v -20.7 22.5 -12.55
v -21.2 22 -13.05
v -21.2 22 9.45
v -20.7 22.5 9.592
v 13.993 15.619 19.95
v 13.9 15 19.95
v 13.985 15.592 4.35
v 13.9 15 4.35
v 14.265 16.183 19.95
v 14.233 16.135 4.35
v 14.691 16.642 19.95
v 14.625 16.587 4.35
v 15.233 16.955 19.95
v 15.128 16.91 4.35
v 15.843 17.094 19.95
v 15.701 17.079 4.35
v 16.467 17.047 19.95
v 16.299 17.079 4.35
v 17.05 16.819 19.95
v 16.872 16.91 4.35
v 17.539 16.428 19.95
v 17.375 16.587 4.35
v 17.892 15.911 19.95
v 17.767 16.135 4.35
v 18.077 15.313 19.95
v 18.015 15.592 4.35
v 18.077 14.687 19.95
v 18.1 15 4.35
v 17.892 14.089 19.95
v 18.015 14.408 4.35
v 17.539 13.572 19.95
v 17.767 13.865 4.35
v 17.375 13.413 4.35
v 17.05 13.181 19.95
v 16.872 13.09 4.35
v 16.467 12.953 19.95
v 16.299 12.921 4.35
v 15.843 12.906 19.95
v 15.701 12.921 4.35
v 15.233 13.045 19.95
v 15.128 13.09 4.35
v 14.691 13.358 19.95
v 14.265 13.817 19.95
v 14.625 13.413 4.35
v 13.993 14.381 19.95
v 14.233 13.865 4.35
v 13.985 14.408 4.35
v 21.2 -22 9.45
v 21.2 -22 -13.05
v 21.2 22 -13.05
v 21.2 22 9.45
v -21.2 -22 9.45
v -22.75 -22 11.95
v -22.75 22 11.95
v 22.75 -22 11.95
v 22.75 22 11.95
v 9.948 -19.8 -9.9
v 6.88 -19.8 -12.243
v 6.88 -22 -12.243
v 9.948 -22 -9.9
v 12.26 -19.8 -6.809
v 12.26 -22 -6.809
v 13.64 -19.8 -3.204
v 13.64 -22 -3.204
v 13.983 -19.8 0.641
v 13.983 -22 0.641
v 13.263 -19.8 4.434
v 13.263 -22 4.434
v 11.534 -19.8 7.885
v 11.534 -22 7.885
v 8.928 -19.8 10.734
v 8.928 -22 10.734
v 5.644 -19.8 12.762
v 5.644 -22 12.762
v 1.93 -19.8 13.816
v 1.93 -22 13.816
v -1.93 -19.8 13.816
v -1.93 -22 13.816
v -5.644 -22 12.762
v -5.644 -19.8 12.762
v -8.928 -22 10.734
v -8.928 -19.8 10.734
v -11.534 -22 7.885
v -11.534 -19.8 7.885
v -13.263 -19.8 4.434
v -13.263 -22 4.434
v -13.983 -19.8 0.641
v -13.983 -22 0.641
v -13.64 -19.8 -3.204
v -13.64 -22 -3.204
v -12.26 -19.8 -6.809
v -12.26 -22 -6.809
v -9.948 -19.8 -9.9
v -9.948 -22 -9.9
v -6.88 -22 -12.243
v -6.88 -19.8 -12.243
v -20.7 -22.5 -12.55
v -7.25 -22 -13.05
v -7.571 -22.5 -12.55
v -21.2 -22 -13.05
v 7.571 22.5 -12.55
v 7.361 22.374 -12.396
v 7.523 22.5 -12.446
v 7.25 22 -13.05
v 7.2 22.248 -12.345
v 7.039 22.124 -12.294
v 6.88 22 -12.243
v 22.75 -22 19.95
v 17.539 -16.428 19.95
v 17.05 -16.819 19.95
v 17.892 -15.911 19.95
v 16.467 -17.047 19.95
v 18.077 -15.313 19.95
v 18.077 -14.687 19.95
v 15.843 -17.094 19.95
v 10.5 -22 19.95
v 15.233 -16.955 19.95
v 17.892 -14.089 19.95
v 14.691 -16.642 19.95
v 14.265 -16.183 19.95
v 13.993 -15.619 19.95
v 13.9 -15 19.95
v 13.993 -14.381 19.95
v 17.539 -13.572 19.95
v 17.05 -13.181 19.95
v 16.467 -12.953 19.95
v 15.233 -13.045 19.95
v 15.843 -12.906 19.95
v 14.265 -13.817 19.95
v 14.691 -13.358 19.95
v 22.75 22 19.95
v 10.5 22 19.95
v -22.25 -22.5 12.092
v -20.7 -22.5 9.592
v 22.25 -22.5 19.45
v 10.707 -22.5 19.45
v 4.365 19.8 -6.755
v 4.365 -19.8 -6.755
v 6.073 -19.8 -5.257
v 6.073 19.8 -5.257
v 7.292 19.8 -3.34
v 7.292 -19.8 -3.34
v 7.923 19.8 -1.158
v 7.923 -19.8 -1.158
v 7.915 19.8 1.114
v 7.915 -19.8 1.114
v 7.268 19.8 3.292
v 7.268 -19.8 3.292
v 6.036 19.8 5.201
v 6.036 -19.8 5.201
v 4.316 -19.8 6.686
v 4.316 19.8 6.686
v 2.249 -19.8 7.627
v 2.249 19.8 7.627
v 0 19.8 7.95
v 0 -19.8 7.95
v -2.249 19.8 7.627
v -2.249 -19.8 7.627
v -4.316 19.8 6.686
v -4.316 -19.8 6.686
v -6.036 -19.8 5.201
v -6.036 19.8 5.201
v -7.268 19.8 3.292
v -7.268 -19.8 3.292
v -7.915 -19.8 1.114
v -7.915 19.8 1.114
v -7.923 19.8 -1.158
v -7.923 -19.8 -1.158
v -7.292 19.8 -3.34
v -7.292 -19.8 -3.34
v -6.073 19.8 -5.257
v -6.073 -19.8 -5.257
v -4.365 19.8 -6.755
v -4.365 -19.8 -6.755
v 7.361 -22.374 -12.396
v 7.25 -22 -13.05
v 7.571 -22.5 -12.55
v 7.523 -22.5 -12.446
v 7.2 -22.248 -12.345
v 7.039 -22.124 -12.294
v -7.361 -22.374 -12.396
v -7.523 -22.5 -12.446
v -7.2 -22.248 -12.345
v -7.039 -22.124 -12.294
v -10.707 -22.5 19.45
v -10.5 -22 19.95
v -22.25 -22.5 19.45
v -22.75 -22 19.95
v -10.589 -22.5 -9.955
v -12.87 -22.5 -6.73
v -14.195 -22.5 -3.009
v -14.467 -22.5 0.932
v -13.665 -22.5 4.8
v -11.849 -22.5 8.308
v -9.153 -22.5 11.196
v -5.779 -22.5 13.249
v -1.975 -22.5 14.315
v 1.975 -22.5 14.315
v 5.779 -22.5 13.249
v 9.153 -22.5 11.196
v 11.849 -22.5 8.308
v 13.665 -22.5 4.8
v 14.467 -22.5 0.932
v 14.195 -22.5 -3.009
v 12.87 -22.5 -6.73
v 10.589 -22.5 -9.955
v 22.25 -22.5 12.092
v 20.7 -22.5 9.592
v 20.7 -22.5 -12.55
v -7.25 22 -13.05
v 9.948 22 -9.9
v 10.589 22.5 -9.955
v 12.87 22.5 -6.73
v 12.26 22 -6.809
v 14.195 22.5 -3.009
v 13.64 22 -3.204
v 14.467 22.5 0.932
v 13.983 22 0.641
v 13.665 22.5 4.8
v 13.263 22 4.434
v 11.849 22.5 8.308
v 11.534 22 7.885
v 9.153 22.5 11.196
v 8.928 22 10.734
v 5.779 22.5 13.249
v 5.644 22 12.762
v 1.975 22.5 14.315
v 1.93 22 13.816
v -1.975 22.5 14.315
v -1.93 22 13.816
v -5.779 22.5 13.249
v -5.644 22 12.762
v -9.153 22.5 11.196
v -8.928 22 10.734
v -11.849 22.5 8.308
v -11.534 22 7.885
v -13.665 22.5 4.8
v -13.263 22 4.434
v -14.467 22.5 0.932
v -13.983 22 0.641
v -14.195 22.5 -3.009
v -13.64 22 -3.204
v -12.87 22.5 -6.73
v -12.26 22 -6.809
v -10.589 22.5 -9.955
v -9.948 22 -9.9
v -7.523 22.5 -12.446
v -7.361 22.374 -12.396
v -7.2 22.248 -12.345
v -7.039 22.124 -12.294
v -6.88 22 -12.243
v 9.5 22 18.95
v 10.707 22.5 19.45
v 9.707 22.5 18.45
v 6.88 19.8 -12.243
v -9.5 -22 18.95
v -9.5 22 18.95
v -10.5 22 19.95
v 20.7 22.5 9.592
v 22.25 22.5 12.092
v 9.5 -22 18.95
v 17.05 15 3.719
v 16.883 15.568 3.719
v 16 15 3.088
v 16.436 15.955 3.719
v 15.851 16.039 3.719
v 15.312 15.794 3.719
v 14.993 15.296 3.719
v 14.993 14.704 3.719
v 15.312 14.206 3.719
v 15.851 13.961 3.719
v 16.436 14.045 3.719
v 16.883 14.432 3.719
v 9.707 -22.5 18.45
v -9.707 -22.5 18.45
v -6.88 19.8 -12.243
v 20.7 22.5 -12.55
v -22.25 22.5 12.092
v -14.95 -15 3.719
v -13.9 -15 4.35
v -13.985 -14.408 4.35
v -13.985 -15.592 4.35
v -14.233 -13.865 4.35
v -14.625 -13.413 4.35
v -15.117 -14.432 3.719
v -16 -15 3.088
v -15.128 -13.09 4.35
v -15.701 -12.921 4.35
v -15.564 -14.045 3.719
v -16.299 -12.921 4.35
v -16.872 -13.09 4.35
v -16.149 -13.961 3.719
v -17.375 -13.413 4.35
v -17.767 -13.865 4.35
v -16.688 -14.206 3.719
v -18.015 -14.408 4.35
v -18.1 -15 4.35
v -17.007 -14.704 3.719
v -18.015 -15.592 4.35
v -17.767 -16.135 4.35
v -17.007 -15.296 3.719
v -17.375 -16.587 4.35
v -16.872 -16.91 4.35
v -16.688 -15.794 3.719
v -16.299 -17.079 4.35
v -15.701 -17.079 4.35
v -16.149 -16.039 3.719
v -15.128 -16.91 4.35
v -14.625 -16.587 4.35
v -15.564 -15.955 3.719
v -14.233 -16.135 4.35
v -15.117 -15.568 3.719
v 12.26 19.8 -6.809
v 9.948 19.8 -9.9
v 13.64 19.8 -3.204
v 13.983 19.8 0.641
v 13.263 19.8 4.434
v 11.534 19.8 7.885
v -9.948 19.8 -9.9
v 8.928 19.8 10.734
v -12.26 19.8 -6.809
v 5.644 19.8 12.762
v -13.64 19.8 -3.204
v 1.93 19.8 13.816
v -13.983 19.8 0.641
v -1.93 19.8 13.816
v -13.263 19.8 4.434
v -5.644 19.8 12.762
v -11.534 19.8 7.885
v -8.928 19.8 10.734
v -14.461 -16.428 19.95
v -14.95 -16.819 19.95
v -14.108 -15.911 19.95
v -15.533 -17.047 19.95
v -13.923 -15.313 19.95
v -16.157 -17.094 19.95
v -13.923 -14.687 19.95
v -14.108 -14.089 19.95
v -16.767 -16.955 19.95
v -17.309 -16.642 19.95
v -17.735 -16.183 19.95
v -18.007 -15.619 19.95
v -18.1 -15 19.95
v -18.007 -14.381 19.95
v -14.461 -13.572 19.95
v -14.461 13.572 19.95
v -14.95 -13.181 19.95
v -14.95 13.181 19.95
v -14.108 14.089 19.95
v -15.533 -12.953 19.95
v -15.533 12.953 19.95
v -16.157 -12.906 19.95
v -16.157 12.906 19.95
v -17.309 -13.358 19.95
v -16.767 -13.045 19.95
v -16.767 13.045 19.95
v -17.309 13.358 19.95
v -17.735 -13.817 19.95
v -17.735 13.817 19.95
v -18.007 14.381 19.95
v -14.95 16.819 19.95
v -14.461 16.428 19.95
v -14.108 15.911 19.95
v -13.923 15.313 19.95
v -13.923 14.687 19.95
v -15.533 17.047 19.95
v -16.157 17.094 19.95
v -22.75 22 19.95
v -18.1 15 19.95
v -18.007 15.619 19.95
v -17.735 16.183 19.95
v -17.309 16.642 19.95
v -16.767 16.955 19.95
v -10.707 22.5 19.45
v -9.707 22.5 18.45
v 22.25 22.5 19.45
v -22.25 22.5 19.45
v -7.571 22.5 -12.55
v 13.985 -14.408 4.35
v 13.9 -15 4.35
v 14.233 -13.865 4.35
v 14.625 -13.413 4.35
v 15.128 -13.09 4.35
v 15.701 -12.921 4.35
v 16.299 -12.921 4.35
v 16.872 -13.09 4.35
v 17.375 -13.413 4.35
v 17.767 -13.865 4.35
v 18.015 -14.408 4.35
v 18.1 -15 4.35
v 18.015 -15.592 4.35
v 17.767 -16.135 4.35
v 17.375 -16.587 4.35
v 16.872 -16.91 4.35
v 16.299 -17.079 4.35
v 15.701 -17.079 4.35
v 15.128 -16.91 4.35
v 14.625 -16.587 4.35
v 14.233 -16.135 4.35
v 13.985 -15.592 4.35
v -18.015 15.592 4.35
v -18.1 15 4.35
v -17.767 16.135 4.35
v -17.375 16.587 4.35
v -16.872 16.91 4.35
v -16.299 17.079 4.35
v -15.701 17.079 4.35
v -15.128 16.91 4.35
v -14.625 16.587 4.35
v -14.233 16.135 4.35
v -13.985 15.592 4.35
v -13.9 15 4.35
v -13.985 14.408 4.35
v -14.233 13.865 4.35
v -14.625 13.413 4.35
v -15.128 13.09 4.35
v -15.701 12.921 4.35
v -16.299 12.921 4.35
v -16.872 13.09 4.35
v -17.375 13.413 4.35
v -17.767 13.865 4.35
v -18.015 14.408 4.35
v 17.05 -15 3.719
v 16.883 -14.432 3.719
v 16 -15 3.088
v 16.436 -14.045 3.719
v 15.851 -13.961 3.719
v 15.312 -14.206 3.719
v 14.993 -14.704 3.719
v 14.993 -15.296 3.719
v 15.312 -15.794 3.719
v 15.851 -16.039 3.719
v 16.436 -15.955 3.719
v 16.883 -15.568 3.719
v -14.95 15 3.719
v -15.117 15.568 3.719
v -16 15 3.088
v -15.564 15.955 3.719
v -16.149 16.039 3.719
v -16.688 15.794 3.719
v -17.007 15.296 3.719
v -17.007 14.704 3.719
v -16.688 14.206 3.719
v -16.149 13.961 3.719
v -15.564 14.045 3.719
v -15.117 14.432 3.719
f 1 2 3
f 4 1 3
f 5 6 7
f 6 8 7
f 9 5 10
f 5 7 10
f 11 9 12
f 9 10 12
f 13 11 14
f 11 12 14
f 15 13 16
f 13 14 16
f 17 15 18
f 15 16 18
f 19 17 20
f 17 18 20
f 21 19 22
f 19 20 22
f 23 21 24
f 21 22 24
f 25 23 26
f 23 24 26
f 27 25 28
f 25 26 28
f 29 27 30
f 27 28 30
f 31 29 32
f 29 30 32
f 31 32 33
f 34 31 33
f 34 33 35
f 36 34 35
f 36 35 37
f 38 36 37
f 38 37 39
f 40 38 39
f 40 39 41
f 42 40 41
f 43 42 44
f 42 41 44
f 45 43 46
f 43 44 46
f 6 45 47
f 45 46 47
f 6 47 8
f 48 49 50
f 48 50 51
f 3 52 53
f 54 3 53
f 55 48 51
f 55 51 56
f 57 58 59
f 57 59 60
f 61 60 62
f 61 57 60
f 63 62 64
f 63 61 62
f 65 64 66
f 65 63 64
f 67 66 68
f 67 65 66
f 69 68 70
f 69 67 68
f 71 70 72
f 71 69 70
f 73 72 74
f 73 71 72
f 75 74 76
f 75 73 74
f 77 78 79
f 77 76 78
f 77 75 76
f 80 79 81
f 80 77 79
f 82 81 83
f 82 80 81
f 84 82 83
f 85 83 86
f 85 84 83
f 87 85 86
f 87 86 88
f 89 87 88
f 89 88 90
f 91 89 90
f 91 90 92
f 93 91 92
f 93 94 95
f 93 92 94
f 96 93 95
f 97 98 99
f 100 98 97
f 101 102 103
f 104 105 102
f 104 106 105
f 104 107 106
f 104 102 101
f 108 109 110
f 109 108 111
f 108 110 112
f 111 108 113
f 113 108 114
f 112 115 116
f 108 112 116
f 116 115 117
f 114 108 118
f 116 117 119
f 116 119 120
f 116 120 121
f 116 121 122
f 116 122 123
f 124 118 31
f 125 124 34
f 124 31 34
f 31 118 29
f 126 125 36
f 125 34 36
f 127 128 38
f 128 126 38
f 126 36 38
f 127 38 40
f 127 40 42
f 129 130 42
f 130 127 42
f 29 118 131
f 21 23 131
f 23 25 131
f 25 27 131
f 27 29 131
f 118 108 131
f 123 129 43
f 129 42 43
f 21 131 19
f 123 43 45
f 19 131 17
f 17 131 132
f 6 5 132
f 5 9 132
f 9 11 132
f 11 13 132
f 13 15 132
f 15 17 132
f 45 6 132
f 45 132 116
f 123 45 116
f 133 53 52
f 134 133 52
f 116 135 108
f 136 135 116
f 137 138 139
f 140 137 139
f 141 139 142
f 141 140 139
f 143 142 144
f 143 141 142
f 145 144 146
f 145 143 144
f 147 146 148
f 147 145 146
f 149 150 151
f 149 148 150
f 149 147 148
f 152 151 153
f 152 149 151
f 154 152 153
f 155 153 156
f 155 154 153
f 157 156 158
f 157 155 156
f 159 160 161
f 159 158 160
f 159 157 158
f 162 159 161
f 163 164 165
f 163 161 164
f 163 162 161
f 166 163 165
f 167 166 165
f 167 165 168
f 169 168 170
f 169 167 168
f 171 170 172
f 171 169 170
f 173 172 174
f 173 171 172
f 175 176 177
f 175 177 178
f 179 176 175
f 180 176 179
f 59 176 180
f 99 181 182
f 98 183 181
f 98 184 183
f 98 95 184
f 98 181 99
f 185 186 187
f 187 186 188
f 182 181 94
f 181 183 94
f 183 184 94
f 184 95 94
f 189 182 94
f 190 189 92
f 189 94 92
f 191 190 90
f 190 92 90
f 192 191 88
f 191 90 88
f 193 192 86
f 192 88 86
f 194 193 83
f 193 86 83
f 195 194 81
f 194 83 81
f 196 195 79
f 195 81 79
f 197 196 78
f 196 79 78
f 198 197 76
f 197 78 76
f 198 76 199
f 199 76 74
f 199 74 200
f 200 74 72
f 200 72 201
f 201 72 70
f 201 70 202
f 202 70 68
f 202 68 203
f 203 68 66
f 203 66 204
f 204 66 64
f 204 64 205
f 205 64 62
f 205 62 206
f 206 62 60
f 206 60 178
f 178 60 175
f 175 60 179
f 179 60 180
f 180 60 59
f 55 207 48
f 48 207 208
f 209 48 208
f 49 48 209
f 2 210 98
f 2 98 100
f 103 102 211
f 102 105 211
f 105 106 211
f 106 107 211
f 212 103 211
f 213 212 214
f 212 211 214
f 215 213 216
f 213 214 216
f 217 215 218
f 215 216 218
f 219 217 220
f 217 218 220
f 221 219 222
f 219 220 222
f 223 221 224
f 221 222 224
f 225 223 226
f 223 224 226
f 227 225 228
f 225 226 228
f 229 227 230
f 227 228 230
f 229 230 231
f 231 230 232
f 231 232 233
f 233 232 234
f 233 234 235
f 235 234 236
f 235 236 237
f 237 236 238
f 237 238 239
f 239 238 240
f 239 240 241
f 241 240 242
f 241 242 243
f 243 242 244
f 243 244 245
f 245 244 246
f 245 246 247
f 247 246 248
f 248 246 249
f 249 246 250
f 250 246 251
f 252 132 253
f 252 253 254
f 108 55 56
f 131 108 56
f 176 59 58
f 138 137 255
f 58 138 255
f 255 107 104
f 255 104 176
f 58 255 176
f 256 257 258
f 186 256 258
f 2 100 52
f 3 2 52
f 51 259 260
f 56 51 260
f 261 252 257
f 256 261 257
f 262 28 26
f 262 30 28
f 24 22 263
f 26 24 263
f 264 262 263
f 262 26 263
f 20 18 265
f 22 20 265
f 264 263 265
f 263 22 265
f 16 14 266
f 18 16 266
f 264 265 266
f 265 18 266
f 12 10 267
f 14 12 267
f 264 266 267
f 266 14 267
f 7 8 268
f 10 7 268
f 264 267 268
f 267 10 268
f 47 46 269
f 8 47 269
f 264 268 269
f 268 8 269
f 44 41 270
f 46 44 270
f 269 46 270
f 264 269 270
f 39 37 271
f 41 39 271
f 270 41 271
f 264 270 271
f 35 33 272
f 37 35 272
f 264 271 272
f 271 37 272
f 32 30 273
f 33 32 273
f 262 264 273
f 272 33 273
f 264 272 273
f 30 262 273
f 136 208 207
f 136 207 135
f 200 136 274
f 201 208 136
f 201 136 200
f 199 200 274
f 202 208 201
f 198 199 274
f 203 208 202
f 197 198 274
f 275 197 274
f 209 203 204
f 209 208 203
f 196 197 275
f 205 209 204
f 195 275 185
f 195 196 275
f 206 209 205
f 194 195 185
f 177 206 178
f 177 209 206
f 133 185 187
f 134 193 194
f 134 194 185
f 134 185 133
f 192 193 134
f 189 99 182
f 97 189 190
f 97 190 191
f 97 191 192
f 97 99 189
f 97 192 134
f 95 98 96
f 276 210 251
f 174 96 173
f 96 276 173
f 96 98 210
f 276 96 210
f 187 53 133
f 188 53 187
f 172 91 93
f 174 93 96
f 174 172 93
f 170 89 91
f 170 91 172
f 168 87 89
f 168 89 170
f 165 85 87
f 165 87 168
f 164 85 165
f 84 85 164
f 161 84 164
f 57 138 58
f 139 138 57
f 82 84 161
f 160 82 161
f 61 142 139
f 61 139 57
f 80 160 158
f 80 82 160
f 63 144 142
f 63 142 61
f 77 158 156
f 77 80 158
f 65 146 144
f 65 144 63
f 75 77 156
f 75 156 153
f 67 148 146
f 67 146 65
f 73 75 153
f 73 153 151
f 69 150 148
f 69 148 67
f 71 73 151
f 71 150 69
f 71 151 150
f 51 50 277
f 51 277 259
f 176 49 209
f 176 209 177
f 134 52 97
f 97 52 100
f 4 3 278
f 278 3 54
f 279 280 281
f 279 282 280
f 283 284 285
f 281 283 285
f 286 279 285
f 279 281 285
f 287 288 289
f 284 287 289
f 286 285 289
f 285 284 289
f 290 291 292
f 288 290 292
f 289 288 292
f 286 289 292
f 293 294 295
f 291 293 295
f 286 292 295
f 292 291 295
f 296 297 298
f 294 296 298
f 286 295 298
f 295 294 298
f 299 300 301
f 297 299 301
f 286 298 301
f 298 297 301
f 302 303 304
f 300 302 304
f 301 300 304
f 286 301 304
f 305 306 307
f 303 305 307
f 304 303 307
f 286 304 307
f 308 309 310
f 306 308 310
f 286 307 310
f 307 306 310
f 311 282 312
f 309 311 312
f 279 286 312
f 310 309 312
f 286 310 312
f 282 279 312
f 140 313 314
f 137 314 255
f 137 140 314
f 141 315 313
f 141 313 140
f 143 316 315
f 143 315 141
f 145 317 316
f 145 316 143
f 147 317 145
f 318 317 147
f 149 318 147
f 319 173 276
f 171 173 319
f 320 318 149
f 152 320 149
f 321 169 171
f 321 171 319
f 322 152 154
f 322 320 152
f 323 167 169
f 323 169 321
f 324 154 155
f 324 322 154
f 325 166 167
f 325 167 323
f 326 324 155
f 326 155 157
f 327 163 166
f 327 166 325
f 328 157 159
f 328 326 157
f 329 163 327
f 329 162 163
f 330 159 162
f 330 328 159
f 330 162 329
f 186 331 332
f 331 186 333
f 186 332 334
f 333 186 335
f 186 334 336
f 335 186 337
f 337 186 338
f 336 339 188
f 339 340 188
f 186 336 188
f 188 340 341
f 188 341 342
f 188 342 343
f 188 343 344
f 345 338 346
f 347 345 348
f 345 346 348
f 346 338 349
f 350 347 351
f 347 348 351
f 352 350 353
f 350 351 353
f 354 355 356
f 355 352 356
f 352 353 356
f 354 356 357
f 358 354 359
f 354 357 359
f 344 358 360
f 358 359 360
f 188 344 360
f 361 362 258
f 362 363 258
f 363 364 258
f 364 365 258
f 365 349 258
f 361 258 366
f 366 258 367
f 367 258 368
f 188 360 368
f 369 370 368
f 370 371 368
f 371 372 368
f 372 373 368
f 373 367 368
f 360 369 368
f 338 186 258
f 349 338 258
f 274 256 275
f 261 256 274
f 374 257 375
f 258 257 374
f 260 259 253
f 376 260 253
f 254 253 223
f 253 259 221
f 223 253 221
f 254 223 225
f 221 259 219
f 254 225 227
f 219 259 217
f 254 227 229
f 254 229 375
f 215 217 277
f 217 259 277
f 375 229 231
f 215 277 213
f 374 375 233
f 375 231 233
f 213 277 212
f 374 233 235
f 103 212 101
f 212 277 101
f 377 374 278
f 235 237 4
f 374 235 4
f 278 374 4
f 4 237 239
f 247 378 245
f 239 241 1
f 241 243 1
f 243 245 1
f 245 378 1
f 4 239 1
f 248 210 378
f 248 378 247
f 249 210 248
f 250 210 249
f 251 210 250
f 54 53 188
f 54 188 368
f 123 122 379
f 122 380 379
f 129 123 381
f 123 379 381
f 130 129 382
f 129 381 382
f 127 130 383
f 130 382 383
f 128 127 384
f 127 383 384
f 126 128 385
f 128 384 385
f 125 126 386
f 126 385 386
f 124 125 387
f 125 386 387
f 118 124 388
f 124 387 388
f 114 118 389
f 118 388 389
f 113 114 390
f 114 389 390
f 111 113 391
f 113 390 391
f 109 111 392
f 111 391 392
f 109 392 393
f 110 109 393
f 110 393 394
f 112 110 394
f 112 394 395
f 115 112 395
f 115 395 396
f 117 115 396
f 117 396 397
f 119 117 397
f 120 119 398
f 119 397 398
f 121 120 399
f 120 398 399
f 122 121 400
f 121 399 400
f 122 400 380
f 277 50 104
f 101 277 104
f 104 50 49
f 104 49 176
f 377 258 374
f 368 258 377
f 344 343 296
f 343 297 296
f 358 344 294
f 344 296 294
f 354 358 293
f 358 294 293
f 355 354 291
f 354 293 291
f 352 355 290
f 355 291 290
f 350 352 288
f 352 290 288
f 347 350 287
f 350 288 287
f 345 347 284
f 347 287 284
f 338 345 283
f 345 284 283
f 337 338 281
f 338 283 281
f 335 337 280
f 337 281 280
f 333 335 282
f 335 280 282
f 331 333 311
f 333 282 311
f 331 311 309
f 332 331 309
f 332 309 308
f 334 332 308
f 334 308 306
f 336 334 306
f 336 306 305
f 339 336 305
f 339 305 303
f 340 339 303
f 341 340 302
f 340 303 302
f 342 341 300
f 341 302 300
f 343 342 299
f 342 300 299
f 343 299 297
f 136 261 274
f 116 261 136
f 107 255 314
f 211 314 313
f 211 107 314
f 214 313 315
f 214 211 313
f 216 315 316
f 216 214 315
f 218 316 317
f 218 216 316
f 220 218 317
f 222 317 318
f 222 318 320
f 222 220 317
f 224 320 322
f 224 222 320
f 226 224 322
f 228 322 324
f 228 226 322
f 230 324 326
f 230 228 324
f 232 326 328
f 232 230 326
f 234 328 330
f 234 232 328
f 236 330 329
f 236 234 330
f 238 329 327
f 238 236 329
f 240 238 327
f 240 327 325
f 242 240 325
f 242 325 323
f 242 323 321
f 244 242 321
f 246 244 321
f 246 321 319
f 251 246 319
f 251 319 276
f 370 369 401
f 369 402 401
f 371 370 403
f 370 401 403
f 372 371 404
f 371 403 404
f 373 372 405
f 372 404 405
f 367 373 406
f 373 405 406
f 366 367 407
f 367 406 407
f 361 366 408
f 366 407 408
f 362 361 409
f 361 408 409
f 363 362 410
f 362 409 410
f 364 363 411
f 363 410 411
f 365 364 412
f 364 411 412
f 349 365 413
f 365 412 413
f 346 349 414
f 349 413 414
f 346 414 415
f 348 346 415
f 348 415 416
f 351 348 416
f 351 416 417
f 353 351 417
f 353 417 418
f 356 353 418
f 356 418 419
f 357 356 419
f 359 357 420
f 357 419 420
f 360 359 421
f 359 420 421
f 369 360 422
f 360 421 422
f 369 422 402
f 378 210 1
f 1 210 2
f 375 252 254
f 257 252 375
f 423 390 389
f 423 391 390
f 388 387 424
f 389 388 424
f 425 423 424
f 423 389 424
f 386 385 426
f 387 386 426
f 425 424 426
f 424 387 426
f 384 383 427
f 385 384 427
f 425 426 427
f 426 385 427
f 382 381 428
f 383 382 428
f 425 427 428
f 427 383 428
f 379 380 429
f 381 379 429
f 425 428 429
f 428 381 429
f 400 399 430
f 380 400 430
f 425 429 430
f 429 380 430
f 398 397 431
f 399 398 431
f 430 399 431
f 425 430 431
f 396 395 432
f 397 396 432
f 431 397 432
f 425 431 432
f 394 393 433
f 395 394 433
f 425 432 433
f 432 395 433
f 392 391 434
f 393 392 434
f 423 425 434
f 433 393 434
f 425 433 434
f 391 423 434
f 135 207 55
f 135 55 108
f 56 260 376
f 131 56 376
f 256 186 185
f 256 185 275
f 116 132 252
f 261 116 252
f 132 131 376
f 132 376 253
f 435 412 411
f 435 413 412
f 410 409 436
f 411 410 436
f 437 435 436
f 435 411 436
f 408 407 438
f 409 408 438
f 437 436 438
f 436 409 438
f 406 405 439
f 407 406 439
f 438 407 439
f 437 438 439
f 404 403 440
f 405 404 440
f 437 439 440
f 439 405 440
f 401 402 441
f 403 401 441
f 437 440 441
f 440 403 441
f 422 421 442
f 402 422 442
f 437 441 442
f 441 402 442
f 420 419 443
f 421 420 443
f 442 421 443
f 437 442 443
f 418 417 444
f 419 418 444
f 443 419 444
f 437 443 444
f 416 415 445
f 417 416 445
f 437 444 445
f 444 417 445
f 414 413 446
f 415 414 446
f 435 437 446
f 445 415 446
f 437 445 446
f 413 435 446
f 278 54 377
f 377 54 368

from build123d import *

# Parameters (mm, degrees)
SKETCH1_W                 = 45.5
SKETCH1_H                 = 45
BOSS_EXTRUDE1_DEPTH       = 33
CUT_EXTRUDE1_DEPTH        = 46
CUT_EXTRUDE2_DEPTH        = 46
CUT_EXTRUDE4_DEPTH        = 46
M5X0_8_TAPPED_HOLE1_D     = 4.2
M5X0_8_TAPPED_HOLE1_DEPTH = 15.6
M5X0_8_TAPPED_HOLE1_TIP   = 1.2618073
CHAMFER1_SIZE             = 0.5


with BuildPart() as part:
    # Sketch1 → Boss-Extrude1 (new body)
    with BuildSketch(Plane(origin=(0, 0, -13.05), x_dir=(-1, 0, 0), z_dir=(0, 0, -1))):
        Rectangle(SKETCH1_W, SKETCH1_H)
    extrude(amount=-BOSS_EXTRUDE1_DEPTH)

    # Sketch2 → Cut-Extrude1 (cut, through all)
    with BuildSketch(Plane(origin=(0, 22.5, 0), x_dir=(-1, 0, 0), z_dir=(0, 1, 0))):
        Polygon((-21.2, -13.05), (-21.2, 9.45), (-22.75, 11.95), (-22.75, -13.05), align=None)
    cut_extrude1 = extrude(amount=-CUT_EXTRUDE1_DEPTH, mode=Mode.SUBTRACT)

    # Mirror1: Cut-Extrude1 across plane
    add(cut_extrude1.mirror(Plane(origin=(0, 0, 0), x_dir=(0, 0, 1), z_dir=(1, 0, 0))), mode=Mode.SUBTRACT)

    # Sketch3 → Cut-Extrude2 (cut, through all)
    with BuildSketch(Plane(origin=(0, 22.5, 0), x_dir=(-1, 0, 0), z_dir=(0, 1, 0))):
        Polygon((-10.5, 19.95), (-9.5, 18.95), (9.5, 18.95), (10.5, 19.95), align=None)
    extrude(amount=-CUT_EXTRUDE2_DEPTH, mode=Mode.SUBTRACT)

    # Sketch5 → Cut-Extrude4 (cut, through all)
    with BuildSketch(Plane(origin=(0, 22.5, 0), x_dir=(-1, 0, 0), z_dir=(0, 1, 0))):
        Polygon((-7.250013867, -13.05), (7.250013867, -13.05), (0, 2.768211411), align=None)
    extrude(amount=-CUT_EXTRUDE4_DEPTH, mode=Mode.SUBTRACT)

    # Sketch6 → Cut-Revolve1 (revolve, cut)
    with BuildSketch(Plane.XY.offset(-0.05)):
        Polygon((14, 22.5), (0, 22.5), (0, -22.5), (14, -22.5), (14, -19.8), (8, -19.8), (8, 19.8), (14, 19.8), align=None)
    revolve(axis=Axis((0, 22.5, -0.05), (0, -1, 0)), mode=Mode.SUBTRACT)

    # M5x0.8 Tapped Hole1
    with Locations(Plane.XY.offset(19.95)):
        with Locations((-16, -15), (16, 15), (16, -15), (-16, 15)):
            Hole(M5X0_8_TAPPED_HOLE1_D / 2, depth=M5X0_8_TAPPED_HOLE1_DEPTH)
            with Locations((0, 0, -(M5X0_8_TAPPED_HOLE1_DEPTH + M5X0_8_TAPPED_HOLE1_TIP / 2))):  # 118° drill point
                Cone(0, M5X0_8_TAPPED_HOLE1_D / 2, M5X0_8_TAPPED_HOLE1_TIP, mode=Mode.SUBTRACT)

    # Chamfer1
    chamfer1_edges = [part.edges().sort_by_distance(p)[0] for p in [
        (14.225006933, -22.5, -13.05),
        (16.625, -22.5, 19.95),
        (21.975, -22.5, 10.7),
        (21.2, -22.5, -1.8),
        (21.2, 22.5, -1.8),
        (21.975, 22.5, 10.7),
        (-14.225006933, 22.5, -13.05),
        (-21.2, 22.5, -1.8),
        (-21.975, 22.5, 10.7),
        (-21.2, -22.5, -1.8),
        (-21.975, -22.5, 10.7),
        (-16.625, -22.5, 19.95),
        (16.625, 22.5, 19.95),
        (-10, -22.5, 19.45),
        (0, -22.5, 18.95),
        (10, -22.5, 19.45),
        (10, 22.5, 19.45),
        (0, 22.5, 18.95),
        (-10, 22.5, 19.45),
        (-14.225006933, -22.5, -13.05),
        (14.225006933, 22.5, -13.05),
        (-7.065034848, -22.5, -12.646409431),
        (-7.065034848, 22.5, -12.646409431),
        (7.065034848, 22.5, -12.646409431),
        (7.065034848, -22.5, -12.646409431),
        (0, 22.5, 13.95),
        (0, -22.5, 13.95),
        (-22.75, -22.5, 15.95),
        (22.75, -22.5, 15.95),
        (22.75, 22.5, 15.95),
        (-22.75, 22.5, 15.95),
        (-16.625, 22.5, 19.95),
    ]]
    chamfer(chamfer1_edges, length=CHAMFER1_SIZE)


solid = part.part
